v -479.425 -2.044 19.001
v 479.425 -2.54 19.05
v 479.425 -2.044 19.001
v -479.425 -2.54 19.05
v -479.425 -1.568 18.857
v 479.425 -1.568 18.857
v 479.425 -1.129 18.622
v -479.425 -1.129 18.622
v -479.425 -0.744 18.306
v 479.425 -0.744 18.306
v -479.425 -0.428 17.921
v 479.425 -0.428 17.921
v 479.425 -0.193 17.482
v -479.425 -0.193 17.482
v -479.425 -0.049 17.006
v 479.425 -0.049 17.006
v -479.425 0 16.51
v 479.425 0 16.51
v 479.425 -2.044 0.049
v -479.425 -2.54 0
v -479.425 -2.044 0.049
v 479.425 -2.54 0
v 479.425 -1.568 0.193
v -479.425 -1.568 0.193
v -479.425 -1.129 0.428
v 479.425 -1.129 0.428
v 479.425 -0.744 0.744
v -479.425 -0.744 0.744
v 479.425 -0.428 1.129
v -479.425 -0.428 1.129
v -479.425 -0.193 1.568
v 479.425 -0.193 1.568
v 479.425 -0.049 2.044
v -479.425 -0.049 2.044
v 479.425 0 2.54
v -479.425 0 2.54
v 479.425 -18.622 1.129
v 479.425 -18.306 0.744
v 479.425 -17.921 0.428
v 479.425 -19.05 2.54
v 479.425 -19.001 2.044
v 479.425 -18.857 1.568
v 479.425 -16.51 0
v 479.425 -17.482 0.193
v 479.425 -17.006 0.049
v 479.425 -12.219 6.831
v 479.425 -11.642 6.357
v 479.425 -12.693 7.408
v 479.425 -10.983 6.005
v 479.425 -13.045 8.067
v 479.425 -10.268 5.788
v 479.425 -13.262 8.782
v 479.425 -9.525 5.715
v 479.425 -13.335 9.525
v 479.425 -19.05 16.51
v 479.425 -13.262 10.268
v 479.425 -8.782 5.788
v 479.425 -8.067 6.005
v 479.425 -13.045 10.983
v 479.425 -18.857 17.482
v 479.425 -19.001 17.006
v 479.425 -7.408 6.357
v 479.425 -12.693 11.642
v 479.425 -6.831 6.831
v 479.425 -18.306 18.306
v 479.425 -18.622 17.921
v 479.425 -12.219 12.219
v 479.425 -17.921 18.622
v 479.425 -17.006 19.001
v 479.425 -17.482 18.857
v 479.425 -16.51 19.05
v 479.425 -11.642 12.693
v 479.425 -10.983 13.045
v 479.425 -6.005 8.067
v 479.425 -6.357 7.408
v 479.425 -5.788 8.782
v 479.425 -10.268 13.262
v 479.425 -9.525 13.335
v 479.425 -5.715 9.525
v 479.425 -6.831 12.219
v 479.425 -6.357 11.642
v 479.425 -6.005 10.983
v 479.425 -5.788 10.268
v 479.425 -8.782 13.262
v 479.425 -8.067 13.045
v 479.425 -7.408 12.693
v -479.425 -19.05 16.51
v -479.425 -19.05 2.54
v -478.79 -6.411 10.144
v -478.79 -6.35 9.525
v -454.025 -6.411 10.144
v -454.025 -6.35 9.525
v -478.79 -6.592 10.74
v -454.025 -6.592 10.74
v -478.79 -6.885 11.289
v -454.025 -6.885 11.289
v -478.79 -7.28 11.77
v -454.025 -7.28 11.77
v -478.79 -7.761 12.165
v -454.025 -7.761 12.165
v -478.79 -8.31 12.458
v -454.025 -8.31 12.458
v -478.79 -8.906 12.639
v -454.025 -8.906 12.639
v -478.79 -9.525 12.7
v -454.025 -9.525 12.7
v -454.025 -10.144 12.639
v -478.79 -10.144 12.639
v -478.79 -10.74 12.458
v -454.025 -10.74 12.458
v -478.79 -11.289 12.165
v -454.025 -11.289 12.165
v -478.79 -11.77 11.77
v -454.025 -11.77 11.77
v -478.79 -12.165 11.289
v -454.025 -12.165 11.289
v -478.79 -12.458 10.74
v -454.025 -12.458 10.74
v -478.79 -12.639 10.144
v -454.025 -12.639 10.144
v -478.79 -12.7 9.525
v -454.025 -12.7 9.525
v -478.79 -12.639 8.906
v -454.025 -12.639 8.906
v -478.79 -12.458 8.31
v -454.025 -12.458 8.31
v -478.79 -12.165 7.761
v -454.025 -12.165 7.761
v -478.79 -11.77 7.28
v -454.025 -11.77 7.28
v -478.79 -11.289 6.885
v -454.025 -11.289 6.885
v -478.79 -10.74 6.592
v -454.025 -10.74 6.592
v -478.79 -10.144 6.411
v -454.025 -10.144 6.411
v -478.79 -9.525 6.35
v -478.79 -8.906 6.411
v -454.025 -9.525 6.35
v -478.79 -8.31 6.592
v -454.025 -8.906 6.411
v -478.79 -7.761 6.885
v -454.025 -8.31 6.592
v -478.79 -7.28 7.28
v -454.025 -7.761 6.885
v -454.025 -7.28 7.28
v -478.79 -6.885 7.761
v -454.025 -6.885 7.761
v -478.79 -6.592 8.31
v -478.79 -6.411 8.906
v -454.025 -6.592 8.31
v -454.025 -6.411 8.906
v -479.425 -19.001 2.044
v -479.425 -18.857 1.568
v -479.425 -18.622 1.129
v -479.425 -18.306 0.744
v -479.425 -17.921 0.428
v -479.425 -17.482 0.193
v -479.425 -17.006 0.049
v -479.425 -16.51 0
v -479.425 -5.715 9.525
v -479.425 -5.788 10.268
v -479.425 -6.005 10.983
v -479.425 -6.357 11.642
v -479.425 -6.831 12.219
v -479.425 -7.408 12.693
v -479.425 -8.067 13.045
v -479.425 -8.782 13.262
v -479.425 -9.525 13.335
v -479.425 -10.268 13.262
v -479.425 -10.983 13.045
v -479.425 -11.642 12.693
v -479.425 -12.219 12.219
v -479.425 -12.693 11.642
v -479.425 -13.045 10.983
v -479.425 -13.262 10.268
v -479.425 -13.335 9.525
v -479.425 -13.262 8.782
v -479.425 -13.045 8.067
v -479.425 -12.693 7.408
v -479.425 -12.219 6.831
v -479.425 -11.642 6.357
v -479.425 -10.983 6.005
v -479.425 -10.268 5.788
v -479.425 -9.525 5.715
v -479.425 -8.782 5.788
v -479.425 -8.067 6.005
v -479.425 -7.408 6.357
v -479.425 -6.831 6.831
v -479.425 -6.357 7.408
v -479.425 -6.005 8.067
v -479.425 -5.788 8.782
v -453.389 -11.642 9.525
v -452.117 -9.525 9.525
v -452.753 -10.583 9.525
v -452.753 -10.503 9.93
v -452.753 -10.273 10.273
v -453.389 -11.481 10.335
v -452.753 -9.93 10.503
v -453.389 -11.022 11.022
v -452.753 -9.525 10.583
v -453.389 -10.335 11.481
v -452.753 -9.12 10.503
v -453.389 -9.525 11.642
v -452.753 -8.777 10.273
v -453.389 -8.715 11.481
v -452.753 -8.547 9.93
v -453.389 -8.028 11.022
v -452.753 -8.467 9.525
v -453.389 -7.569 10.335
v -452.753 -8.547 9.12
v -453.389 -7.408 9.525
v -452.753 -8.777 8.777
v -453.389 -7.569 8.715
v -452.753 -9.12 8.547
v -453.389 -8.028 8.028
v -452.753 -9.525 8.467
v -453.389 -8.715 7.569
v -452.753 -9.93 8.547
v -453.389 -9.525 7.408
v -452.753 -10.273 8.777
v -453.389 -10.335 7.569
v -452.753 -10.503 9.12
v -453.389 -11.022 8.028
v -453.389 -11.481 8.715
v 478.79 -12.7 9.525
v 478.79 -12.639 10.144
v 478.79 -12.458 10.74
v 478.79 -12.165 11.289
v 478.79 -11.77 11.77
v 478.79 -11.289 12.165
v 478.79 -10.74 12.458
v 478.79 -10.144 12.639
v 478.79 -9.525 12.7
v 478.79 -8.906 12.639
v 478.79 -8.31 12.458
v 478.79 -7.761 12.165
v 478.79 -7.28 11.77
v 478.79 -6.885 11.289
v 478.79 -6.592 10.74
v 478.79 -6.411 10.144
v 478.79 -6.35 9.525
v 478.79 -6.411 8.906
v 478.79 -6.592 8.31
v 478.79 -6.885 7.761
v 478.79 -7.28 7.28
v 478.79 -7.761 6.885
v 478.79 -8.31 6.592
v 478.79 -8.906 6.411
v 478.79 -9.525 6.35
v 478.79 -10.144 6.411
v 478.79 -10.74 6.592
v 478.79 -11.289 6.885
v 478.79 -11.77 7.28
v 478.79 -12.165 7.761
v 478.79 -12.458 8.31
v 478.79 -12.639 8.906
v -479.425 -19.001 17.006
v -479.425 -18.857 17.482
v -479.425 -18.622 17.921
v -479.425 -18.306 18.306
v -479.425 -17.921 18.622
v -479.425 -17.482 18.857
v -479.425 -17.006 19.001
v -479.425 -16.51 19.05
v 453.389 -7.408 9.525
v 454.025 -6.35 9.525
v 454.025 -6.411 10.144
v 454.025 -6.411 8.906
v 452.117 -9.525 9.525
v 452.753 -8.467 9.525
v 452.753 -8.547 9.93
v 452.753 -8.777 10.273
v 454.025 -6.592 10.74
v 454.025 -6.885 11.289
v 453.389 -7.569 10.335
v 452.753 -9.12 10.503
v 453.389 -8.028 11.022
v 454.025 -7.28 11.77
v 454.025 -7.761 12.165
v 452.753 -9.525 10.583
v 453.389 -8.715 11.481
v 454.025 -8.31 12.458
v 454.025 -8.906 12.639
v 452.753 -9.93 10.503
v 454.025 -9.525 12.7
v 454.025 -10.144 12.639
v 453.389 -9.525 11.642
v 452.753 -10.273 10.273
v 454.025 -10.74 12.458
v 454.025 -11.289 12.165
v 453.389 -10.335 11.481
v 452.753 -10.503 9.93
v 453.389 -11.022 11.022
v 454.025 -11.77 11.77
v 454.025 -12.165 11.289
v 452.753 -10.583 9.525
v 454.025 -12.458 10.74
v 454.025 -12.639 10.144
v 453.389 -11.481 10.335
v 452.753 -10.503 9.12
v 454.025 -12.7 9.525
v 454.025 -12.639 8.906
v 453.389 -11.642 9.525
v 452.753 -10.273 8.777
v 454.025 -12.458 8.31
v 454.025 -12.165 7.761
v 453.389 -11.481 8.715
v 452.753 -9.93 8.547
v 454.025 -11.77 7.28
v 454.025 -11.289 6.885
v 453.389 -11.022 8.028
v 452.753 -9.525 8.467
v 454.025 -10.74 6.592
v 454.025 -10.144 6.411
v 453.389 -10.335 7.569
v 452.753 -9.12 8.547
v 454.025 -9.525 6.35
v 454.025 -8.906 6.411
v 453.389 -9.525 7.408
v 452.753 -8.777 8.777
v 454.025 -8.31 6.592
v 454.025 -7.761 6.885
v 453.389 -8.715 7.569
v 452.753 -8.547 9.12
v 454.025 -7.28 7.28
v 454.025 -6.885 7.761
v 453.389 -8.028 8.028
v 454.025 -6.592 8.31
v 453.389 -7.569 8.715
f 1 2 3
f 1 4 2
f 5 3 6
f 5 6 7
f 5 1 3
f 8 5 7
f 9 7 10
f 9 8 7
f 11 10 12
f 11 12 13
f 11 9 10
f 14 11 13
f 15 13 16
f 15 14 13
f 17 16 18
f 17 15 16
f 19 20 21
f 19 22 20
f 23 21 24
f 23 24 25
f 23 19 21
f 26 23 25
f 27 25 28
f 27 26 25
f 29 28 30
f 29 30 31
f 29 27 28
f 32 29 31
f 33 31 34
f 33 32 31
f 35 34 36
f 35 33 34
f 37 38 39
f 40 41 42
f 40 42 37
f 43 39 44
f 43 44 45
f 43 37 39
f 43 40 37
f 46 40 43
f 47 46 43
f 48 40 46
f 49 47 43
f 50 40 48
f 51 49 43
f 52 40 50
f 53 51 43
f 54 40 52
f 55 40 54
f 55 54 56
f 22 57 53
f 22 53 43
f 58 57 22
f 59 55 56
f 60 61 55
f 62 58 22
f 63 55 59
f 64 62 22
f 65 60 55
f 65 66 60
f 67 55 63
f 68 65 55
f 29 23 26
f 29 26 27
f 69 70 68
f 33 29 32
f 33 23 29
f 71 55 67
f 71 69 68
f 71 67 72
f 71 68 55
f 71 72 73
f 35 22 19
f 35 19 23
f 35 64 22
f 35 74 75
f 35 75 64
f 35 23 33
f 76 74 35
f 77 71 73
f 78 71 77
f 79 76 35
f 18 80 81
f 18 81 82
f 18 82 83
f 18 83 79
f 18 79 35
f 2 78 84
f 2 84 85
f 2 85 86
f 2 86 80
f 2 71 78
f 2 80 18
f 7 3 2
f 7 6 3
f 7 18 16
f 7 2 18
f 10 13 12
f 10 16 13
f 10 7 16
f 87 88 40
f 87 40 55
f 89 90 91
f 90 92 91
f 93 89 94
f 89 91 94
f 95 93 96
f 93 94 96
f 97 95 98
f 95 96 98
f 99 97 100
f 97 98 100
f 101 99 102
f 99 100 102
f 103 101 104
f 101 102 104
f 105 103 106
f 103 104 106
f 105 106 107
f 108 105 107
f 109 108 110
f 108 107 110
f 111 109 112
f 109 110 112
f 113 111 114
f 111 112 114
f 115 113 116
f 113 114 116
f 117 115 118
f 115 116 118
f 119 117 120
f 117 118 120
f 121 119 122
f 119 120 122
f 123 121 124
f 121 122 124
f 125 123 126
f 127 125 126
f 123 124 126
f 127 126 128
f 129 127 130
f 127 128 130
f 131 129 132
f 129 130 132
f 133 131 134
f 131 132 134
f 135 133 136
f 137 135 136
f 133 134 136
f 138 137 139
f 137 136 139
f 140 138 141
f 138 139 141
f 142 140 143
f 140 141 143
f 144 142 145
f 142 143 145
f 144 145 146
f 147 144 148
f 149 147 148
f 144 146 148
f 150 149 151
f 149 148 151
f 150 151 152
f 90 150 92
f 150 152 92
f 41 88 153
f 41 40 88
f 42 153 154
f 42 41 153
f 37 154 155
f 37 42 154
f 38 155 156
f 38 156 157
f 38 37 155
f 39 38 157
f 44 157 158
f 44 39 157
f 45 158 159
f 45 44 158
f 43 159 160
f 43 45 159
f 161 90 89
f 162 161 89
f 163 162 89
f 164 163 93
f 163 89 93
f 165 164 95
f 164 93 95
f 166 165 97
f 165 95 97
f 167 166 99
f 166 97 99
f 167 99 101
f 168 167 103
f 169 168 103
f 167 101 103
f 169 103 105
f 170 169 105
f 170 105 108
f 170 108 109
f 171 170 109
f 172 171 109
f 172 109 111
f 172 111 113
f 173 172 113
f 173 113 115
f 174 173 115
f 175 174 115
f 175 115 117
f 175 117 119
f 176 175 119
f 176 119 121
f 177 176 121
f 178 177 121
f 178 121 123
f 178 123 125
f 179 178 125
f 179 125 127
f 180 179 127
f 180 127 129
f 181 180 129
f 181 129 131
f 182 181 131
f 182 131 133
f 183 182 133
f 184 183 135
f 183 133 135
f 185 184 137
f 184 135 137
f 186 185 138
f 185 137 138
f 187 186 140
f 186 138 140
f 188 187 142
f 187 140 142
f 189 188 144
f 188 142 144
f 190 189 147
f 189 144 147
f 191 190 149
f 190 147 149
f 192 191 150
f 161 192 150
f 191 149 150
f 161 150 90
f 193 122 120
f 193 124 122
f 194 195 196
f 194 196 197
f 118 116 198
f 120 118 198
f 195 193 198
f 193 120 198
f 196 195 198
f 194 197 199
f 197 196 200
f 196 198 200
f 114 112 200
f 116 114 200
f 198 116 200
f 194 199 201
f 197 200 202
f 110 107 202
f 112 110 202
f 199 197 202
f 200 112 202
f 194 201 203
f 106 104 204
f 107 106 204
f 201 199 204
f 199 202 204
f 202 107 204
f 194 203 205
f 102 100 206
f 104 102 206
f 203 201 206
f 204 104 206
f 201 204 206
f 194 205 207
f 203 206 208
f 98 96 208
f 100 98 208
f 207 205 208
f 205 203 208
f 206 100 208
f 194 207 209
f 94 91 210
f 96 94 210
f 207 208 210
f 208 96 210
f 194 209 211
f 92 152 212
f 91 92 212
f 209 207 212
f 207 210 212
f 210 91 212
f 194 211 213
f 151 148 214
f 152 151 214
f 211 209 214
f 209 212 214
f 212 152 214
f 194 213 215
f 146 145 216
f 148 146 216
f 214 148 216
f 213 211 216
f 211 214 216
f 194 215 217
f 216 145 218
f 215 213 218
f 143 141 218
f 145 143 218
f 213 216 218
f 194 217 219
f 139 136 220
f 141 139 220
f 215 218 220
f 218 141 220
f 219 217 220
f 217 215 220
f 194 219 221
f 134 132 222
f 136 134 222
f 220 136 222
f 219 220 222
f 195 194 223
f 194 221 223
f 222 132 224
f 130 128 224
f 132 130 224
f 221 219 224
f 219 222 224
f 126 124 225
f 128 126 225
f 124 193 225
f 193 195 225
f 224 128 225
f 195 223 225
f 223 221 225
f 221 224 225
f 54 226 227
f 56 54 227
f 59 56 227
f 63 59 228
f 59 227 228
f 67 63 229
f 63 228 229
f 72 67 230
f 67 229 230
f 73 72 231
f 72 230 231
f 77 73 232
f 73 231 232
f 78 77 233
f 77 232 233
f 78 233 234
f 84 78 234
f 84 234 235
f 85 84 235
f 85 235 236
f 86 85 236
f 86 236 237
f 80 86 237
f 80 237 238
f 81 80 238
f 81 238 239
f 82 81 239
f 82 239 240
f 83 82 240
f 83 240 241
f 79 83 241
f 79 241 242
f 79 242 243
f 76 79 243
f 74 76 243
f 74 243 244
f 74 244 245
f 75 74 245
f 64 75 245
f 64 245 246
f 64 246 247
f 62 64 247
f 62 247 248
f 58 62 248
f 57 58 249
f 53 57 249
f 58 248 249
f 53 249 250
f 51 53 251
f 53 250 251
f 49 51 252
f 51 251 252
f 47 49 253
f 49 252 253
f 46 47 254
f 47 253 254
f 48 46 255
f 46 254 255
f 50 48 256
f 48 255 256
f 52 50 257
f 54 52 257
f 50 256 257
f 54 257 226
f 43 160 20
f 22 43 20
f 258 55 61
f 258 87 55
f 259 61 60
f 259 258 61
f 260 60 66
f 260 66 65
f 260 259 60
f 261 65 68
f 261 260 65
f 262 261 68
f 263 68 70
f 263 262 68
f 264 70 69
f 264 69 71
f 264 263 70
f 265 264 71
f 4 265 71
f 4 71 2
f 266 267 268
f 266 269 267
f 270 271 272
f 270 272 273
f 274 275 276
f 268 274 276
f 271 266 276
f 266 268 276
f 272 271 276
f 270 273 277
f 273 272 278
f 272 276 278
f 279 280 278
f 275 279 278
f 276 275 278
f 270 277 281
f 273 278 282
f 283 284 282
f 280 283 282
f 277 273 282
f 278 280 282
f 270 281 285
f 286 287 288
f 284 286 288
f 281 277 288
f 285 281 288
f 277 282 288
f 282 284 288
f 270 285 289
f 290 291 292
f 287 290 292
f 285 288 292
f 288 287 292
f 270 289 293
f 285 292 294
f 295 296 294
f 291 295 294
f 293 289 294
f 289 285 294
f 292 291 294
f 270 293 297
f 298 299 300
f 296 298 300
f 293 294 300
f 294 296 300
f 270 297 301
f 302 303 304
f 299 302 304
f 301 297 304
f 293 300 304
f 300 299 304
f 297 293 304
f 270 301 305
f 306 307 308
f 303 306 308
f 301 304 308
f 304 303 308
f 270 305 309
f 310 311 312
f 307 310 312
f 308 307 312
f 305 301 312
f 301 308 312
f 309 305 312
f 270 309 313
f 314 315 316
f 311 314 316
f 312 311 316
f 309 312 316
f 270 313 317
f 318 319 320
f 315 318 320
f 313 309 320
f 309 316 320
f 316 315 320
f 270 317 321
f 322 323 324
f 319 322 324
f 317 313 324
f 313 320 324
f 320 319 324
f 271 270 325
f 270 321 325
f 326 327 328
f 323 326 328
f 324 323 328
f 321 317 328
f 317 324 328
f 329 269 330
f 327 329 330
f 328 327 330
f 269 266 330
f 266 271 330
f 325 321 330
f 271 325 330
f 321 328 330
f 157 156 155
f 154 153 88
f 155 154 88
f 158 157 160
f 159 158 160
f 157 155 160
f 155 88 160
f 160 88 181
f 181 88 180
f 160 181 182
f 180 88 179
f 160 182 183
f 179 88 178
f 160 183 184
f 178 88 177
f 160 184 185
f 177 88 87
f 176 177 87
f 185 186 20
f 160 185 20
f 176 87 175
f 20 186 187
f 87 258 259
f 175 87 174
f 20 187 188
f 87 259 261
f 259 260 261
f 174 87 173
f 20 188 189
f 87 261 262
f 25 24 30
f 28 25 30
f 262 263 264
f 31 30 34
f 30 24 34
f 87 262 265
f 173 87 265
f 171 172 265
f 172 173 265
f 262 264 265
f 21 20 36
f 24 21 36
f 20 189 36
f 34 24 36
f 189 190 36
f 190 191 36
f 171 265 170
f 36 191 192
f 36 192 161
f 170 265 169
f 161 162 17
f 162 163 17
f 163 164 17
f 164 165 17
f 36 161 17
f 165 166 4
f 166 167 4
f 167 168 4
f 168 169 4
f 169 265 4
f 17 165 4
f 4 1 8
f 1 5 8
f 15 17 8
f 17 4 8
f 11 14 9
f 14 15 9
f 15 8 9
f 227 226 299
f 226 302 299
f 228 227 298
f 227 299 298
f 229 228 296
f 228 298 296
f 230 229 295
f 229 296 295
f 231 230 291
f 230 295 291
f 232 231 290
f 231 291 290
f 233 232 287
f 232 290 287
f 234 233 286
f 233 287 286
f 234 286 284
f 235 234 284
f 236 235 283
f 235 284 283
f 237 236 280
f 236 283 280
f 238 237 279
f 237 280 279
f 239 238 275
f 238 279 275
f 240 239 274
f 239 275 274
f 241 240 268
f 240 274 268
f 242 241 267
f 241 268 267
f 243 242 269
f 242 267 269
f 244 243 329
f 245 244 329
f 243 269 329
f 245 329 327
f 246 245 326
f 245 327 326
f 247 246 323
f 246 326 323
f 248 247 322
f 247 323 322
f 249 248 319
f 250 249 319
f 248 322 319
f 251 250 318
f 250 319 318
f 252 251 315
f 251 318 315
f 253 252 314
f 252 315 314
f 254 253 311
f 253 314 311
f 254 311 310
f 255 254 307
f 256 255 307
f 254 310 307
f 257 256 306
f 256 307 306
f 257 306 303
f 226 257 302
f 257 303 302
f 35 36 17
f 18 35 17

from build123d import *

# Parameters (mm, degrees)
F0_W           = 19.05
F0_H           = 19.05
F1_DEPTH       = 479.425
F3_D           = 6.35
F3_DEPTH       = 25.4
F3_CSINK_D     = 7.62
F3_CSINK_ANGLE = 90
F3_TIP         = 1.9077324654
F5_D           = 6.35
F5_DEPTH       = 25.4
F5_CSINK_D     = 7.62
F5_CSINK_ANGLE = 90
F5_TIP         = 1.9077324654
F6_R           = 2.54


with BuildPart() as f1:
    # F0 (on Right) → F1 (new body, symmetric)
    with BuildSketch(Plane.YZ):
        with Locations((-9.525, 9.525)):
            Rectangle(F0_W, F0_H)
    extrude(amount=F1_DEPTH, both=True)

    # F3
    with Locations(Plane(origin=(-479.425, 0, 0), x_dir=(0, -1, 0), z_dir=(-1, 0, 0))):
        with Locations((9.525, 9.525)):
            CounterSinkHole(F3_D / 2, F3_CSINK_D / 2, depth=F3_DEPTH, counter_sink_angle=F3_CSINK_ANGLE)
            with Locations((0, 0, -(F3_DEPTH + F3_TIP / 2))):  # 118° drill point
                Cone(0, F3_D / 2, F3_TIP, mode=Mode.SUBTRACT)

    # F5
    with Locations(Plane.YZ.offset(479.425)):
        with Locations((-9.525, 9.525)):
            CounterSinkHole(F5_D / 2, F5_CSINK_D / 2, depth=F5_DEPTH, counter_sink_angle=F5_CSINK_ANGLE)
            with Locations((0, 0, -(F5_DEPTH + F5_TIP / 2))):  # 118° drill point
                Cone(0, F5_D / 2, F5_TIP, mode=Mode.SUBTRACT)

    # F6
    f6_edges = [f1.edges().sort_by_distance(p)[0] for p in [
        (0, -19.05, 19.05),
        (0, -19.05, 0),
        (0, 0, 0),
        (0, 0, 19.05),
    ]]
    fillet(f6_edges, radius=F6_R)


solid = f1.part
